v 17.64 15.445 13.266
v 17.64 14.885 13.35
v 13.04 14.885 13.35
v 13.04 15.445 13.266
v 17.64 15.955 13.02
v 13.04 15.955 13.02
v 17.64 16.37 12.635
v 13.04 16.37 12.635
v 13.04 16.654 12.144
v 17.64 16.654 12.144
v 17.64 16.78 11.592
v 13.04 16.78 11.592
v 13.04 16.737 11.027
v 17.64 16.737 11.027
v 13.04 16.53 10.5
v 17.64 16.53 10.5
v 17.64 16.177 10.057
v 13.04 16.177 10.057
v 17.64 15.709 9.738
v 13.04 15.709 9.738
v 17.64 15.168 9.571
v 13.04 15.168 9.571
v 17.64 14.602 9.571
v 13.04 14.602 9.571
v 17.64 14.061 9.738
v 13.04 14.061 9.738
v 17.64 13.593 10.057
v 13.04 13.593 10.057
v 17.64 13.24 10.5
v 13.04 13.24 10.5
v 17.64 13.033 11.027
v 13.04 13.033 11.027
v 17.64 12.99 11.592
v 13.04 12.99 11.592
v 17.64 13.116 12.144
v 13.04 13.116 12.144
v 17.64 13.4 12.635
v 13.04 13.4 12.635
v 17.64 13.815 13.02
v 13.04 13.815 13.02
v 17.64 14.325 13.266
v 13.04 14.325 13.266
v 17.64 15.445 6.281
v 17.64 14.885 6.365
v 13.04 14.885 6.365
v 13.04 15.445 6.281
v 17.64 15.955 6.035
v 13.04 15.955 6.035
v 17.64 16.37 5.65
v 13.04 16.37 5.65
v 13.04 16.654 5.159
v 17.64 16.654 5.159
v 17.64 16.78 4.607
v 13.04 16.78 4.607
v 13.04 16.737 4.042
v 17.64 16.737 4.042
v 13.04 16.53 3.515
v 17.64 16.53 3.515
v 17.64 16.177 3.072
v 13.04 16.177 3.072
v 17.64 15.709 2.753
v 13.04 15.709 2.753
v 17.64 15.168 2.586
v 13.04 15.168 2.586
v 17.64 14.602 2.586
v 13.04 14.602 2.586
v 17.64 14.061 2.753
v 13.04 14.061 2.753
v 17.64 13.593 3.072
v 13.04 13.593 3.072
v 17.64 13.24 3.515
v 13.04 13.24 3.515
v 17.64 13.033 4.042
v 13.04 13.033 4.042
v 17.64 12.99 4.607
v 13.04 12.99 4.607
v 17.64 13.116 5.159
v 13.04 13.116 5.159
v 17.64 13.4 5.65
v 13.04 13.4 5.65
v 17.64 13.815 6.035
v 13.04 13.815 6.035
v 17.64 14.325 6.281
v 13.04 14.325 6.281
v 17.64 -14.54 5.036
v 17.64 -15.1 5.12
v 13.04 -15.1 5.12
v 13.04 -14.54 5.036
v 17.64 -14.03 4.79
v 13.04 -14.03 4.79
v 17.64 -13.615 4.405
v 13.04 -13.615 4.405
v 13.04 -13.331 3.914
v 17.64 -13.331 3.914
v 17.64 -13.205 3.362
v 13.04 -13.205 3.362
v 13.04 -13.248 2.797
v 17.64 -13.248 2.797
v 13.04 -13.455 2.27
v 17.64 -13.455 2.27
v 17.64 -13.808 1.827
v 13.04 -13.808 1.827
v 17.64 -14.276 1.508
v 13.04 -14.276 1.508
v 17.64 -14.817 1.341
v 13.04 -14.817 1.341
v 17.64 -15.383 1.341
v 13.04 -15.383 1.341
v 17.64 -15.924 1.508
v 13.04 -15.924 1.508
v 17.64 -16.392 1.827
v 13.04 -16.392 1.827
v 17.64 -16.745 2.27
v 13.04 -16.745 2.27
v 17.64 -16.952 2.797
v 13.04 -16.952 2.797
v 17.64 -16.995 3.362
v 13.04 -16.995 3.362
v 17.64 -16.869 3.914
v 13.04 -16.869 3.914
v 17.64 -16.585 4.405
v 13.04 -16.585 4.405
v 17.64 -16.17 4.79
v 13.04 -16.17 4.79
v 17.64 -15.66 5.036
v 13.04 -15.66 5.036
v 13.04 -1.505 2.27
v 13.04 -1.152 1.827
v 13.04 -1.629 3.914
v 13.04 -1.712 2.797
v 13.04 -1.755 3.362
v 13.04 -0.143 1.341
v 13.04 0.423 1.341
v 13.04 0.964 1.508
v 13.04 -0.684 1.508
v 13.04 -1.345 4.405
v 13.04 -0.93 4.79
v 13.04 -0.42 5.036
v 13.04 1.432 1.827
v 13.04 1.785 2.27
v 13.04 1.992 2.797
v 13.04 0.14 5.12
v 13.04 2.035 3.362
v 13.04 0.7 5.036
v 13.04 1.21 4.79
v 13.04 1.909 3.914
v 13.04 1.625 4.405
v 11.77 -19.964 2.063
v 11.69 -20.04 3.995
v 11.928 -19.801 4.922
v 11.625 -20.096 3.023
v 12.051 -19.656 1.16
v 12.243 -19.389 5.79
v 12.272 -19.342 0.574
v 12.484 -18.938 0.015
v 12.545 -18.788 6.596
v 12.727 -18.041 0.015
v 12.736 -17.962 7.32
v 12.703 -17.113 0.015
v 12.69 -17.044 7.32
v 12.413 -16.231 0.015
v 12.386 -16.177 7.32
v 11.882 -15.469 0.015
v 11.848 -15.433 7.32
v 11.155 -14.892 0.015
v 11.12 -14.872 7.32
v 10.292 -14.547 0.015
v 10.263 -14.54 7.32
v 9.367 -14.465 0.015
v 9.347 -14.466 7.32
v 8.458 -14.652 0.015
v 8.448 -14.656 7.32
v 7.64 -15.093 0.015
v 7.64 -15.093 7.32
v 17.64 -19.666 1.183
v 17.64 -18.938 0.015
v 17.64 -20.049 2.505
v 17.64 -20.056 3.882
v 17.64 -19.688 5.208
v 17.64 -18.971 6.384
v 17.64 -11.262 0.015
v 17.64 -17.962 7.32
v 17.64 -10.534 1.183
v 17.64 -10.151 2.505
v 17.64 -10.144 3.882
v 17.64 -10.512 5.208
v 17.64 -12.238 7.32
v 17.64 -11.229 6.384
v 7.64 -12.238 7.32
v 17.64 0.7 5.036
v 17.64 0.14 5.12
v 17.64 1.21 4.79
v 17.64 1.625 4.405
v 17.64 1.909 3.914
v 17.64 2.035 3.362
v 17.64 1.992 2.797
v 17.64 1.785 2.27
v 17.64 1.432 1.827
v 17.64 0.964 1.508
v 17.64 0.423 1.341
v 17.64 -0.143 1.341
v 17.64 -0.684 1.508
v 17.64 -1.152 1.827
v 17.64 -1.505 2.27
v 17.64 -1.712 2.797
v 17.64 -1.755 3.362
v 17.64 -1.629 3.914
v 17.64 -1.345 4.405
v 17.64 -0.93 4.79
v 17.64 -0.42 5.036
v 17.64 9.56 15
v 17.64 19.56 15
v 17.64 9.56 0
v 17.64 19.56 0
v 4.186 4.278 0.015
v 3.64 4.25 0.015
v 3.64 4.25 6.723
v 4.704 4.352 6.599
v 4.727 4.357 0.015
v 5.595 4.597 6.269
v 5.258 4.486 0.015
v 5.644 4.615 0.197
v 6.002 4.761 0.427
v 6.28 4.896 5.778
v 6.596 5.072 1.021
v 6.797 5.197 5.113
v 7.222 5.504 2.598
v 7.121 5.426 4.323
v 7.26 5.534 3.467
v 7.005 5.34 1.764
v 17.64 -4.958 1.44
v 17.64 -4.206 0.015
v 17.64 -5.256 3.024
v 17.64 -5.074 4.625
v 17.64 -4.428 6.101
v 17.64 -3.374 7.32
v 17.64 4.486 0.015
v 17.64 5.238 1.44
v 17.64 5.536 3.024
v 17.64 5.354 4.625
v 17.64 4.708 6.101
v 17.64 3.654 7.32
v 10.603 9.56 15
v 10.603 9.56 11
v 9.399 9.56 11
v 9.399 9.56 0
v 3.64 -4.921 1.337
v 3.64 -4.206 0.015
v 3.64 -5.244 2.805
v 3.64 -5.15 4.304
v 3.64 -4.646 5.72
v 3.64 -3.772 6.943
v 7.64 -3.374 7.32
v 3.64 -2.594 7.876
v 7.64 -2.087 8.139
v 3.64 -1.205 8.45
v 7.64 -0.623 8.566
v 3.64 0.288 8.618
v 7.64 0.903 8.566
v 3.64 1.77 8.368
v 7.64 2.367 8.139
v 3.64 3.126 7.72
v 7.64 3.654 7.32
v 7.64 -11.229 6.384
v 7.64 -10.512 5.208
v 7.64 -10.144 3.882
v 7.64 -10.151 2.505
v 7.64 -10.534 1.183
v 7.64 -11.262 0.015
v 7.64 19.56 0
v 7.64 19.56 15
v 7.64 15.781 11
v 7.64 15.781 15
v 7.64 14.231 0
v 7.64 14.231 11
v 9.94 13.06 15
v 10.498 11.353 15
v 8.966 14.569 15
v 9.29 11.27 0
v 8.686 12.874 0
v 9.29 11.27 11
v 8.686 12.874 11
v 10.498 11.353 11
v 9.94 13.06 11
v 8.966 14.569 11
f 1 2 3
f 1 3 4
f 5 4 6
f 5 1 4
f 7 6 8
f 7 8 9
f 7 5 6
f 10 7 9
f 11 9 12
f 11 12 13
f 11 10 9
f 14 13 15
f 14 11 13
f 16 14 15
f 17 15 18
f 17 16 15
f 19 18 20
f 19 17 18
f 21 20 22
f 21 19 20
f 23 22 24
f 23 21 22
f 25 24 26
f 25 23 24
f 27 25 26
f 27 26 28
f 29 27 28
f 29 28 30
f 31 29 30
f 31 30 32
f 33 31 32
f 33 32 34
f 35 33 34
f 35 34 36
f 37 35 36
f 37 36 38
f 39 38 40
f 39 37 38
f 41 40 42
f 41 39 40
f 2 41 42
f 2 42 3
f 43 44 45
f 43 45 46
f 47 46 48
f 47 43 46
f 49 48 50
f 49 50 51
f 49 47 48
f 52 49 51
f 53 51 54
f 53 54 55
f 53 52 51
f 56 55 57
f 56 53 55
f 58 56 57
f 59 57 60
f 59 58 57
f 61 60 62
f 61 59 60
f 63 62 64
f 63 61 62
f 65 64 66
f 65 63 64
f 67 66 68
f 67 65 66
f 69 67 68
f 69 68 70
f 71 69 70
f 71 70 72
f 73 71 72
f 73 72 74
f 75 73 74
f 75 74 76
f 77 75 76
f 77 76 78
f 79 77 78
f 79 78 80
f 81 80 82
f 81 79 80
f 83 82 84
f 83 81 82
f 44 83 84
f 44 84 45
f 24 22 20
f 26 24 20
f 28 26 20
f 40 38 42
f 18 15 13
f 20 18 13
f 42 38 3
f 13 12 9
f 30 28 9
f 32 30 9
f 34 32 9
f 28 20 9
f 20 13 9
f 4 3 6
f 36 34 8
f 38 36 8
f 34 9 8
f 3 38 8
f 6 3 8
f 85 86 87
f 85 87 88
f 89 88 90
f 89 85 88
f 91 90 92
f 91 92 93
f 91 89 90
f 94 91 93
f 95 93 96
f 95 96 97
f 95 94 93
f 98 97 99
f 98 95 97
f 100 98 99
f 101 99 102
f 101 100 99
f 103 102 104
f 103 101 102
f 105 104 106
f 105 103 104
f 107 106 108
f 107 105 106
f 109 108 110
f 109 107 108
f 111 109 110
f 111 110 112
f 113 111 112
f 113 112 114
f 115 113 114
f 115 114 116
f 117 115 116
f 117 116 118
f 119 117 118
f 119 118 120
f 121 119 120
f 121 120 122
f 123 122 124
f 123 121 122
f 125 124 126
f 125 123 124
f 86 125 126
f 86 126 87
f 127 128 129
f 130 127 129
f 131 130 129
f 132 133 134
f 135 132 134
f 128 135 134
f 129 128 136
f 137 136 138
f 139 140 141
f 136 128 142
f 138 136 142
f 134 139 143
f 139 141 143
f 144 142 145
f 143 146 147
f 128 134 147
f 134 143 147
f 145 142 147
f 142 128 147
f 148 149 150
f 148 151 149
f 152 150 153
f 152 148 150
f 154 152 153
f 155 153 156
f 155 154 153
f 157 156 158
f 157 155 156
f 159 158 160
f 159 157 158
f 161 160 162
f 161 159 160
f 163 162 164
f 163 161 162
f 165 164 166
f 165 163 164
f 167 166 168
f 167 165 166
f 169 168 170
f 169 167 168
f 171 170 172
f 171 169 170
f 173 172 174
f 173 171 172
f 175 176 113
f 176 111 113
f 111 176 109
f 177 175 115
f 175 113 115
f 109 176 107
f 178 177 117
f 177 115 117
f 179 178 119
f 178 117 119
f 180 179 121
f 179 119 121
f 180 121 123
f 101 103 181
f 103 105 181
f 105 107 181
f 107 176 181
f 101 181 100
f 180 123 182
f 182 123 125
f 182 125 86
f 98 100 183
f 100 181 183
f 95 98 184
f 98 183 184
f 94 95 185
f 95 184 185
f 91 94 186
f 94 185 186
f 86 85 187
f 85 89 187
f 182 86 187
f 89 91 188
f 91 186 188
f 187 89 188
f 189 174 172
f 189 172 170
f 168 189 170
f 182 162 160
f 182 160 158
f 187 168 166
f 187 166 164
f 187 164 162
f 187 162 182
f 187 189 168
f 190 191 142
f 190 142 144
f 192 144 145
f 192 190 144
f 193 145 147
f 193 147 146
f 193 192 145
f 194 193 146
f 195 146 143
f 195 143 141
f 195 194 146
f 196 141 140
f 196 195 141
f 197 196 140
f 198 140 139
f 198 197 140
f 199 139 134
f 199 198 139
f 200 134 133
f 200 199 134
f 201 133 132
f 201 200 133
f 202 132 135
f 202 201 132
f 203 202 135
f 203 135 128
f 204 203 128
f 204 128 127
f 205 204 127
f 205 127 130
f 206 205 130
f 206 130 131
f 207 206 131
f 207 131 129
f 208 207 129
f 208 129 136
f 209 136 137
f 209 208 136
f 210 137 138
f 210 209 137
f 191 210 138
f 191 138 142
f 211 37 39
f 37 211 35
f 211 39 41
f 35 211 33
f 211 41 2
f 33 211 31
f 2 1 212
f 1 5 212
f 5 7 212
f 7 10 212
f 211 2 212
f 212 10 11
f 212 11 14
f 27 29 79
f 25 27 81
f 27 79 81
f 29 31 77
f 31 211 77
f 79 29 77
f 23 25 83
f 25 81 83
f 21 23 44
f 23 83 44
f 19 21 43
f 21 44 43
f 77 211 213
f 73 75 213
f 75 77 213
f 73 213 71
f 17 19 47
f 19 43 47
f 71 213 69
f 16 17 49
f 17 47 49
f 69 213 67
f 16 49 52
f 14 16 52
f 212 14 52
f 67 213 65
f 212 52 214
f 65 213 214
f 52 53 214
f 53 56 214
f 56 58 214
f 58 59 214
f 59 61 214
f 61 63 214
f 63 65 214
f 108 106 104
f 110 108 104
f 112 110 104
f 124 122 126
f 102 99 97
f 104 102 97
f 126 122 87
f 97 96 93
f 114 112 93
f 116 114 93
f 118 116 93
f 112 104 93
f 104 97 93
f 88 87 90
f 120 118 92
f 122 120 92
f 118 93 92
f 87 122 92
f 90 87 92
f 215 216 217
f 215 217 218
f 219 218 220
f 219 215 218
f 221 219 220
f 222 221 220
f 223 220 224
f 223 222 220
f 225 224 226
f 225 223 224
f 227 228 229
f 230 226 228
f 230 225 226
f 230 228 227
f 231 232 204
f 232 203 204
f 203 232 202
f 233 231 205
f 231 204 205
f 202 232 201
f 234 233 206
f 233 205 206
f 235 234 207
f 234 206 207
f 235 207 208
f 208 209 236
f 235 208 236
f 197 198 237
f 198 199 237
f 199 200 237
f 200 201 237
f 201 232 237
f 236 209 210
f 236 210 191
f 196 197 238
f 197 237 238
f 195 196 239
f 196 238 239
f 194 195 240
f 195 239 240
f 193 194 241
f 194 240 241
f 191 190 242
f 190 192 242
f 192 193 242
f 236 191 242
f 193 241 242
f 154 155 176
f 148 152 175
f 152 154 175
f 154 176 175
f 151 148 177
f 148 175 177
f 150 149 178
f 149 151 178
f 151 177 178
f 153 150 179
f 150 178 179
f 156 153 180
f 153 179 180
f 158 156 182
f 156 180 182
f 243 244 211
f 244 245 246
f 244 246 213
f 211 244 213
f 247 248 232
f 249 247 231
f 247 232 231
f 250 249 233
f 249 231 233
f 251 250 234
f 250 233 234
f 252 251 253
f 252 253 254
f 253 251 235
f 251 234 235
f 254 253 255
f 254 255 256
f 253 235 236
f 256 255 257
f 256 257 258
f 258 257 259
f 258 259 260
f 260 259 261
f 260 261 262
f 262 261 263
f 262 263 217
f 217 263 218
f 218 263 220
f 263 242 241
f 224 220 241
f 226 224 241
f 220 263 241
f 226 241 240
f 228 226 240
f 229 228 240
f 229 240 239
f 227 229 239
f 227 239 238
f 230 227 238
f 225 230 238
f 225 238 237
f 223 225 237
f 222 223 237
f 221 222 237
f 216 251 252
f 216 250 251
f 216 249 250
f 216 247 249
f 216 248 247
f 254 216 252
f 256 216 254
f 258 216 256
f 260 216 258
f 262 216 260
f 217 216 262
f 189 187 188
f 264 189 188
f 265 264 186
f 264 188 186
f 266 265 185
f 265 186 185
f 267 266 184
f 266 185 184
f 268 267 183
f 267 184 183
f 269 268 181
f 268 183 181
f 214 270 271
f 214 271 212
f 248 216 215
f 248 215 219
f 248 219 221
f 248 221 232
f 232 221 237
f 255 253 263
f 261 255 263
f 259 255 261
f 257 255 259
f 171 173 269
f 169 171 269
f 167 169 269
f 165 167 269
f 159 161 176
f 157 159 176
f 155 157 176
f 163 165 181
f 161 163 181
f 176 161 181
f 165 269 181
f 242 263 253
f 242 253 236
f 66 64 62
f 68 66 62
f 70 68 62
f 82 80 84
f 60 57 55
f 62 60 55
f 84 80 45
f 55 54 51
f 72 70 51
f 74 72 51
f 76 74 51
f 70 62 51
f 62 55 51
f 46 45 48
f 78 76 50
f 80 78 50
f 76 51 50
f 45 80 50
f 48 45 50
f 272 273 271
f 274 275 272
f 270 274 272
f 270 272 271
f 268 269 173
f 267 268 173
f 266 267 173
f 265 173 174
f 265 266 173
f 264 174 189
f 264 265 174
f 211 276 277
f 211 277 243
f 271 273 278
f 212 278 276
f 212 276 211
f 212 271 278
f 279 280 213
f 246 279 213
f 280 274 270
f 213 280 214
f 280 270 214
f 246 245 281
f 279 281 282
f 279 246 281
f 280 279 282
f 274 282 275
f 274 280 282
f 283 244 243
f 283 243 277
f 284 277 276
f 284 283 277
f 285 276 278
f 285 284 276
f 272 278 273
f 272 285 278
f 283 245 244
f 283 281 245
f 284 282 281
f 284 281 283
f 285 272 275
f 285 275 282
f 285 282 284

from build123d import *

# Parameters (mm, degrees)
CYLINDER007_R     = 1.9
CYLINDER007_DEPTH = 4.6
CYLINDER008_R     = 1.9
CYLINDER008_DEPTH = 4.6
CYLINDER006_R     = 1.9
CYLINDER006_DEPTH = 4.6
CYLINDER_R        = 1.9
CYLINDER_DEPTH    = 4.6
CYLINDER005_R     = 7
CYLINDER005_DEPTH = 5
CYLINDER004_R     = 5.8
CYLINDER004_DEPTH = 11.5
BOX003_W          = 15
BOX003_H          = 30
BOX003_DEPTH      = 10
BOX002_W          = 10
BOX002_H          = 30
BOX002_DEPTH      = 10
CYLINDER002_R     = 3.2
CYLINDER002_DEPTH = 12
CYLINDER003_R     = 5.4
CYLINDER003_DEPTH = 14
CYLINDER001_R     = 5
CYLINDER001_DEPTH = 10
BOX001_W          = 10
BOX001_H          = 10
BOX001_DEPTH      = 15


with BuildPart() as cylinder007:
    # Cylinder007 → Cylinder007 (new body)
    with BuildSketch(Plane(origin=(17.64, 14.885, 11.45), x_dir=(0, 0, 1), z_dir=(-1, 0, 0))):
        Circle(CYLINDER007_R)
    extrude(amount=CYLINDER007_DEPTH)


with BuildPart() as cylinder008:
    # Cylinder008 → Cylinder008 (new body)
    with BuildSketch(Plane(origin=(17.64, 0.14, 3.22), x_dir=(0, 0, 1), z_dir=(-1, 0, 0))):
        Circle(CYLINDER008_R)
    extrude(amount=CYLINDER008_DEPTH)


with BuildPart() as cylinder006:
    # Cylinder006 → Cylinder006 (new body)
    with BuildSketch(Plane(origin=(17.64, 14.885, 4.465), x_dir=(0, 0, 1), z_dir=(-1, 0, 0))):
        Circle(CYLINDER006_R)
    extrude(amount=CYLINDER006_DEPTH)


with BuildPart() as cylinder:
    # Cylinder → Cylinder (new body)
    with BuildSketch(Plane(origin=(17.64, -15.1, 3.22), x_dir=(0, 0, 1), z_dir=(-1, 0, 0))):
        Circle(CYLINDER_R)
    extrude(amount=CYLINDER_DEPTH)


with BuildPart() as cylinder005:
    # Cylinder005 → Cylinder005 (new body)
    with BuildSketch(Plane(origin=(3.62, 10.05, 11), x_dir=(1, 0, 0), z_dir=(0, 0, 1))):
        Circle(CYLINDER005_R)
    extrude(amount=CYLINDER005_DEPTH)


with BuildPart() as cylinder004:
    # Cylinder004 → Cylinder004 (new body)
    with BuildSketch(Plane(origin=(3.62, 10.05, 0), x_dir=(1, 0, 0), z_dir=(0, 0, 1))):
        Circle(CYLINDER004_R)
    extrude(amount=CYLINDER004_DEPTH)


with BuildPart() as cube003:
    # Box003 → Box003 (new body)
    with BuildSketch(Plane(origin=(2.64, -21.3, -9.985), x_dir=(1, 0, 0), z_dir=(0, 0, 1))):
        with Locations((7.5, 15)):
            Rectangle(BOX003_W, BOX003_H)
    extrude(amount=BOX003_DEPTH)


with BuildPart() as cube002:
    # Box002 → Box002 (new body)
    with BuildSketch(Plane(origin=(7.64, -21.3, 7.32), x_dir=(1, 0, 0), z_dir=(0, 0, 1))):
        with Locations((5, 15)):
            Rectangle(BOX002_W, BOX002_H)
    extrude(amount=BOX002_DEPTH)


with BuildPart() as cylinder002:
    # Cylinder002 → Cylinder002 (new body)
    with BuildSketch(Plane(origin=(9.55, -17.66, -3), x_dir=(1, 0, 0), z_dir=(0, 0, 1))):
        Circle(CYLINDER002_R)
    extrude(amount=CYLINDER002_DEPTH)


with BuildPart() as cylinder003:
    # Cylinder003 → Cylinder003 (new body)
    with BuildSketch(Plane(origin=(17.64, 0.14, 3.22), x_dir=(0, 0, 1), z_dir=(-1, 0, 0))):
        Circle(CYLINDER003_R)
    extrude(amount=CYLINDER003_DEPTH)


with BuildPart() as fusion:
    # Cylinder001 → Cylinder001 (new body)
    with BuildSketch(Plane(origin=(17.64, -15.1, 3.22), x_dir=(0, 0, 1), z_dir=(-1, 0, 0))):
        Circle(CYLINDER001_R)
    extrude(amount=CYLINDER001_DEPTH)

    # Fusion: union Cylinder003
    add(cylinder003.part)


with BuildPart() as cut008:
    # Box001 → Box001 (new body)
    with BuildSketch(Plane(origin=(7.64, 9.56, 0), x_dir=(1, 0, 0), z_dir=(0, 0, 1))):
        with Locations((5, 5)):
            Rectangle(BOX001_W, BOX001_H)
    extrude(amount=BOX001_DEPTH)

    # Fusion001: union Fusion
    add(fusion.part)

    # Cut: cut Cylinder002
    add(cylinder002.part, mode=Mode.SUBTRACT)

    # Cut001: cut Cube002
    add(cube002.part, mode=Mode.SUBTRACT)

    # Cut002: cut Cube003
    add(cube003.part, mode=Mode.SUBTRACT)

    # Cut003: cut Cylinder004
    add(cylinder004.part, mode=Mode.SUBTRACT)

    # Cut004: cut Cylinder005
    add(cylinder005.part, mode=Mode.SUBTRACT)

    # Cut005: cut Cylinder
    add(cylinder.part, mode=Mode.SUBTRACT)

    # Cut006: cut Cylinder006
    add(cylinder006.part, mode=Mode.SUBTRACT)

    # Cut007: cut Cylinder008
    add(cylinder008.part, mode=Mode.SUBTRACT)

    # Cut008: cut Cylinder007
    add(cylinder007.part, mode=Mode.SUBTRACT)


solid = cut008.part
